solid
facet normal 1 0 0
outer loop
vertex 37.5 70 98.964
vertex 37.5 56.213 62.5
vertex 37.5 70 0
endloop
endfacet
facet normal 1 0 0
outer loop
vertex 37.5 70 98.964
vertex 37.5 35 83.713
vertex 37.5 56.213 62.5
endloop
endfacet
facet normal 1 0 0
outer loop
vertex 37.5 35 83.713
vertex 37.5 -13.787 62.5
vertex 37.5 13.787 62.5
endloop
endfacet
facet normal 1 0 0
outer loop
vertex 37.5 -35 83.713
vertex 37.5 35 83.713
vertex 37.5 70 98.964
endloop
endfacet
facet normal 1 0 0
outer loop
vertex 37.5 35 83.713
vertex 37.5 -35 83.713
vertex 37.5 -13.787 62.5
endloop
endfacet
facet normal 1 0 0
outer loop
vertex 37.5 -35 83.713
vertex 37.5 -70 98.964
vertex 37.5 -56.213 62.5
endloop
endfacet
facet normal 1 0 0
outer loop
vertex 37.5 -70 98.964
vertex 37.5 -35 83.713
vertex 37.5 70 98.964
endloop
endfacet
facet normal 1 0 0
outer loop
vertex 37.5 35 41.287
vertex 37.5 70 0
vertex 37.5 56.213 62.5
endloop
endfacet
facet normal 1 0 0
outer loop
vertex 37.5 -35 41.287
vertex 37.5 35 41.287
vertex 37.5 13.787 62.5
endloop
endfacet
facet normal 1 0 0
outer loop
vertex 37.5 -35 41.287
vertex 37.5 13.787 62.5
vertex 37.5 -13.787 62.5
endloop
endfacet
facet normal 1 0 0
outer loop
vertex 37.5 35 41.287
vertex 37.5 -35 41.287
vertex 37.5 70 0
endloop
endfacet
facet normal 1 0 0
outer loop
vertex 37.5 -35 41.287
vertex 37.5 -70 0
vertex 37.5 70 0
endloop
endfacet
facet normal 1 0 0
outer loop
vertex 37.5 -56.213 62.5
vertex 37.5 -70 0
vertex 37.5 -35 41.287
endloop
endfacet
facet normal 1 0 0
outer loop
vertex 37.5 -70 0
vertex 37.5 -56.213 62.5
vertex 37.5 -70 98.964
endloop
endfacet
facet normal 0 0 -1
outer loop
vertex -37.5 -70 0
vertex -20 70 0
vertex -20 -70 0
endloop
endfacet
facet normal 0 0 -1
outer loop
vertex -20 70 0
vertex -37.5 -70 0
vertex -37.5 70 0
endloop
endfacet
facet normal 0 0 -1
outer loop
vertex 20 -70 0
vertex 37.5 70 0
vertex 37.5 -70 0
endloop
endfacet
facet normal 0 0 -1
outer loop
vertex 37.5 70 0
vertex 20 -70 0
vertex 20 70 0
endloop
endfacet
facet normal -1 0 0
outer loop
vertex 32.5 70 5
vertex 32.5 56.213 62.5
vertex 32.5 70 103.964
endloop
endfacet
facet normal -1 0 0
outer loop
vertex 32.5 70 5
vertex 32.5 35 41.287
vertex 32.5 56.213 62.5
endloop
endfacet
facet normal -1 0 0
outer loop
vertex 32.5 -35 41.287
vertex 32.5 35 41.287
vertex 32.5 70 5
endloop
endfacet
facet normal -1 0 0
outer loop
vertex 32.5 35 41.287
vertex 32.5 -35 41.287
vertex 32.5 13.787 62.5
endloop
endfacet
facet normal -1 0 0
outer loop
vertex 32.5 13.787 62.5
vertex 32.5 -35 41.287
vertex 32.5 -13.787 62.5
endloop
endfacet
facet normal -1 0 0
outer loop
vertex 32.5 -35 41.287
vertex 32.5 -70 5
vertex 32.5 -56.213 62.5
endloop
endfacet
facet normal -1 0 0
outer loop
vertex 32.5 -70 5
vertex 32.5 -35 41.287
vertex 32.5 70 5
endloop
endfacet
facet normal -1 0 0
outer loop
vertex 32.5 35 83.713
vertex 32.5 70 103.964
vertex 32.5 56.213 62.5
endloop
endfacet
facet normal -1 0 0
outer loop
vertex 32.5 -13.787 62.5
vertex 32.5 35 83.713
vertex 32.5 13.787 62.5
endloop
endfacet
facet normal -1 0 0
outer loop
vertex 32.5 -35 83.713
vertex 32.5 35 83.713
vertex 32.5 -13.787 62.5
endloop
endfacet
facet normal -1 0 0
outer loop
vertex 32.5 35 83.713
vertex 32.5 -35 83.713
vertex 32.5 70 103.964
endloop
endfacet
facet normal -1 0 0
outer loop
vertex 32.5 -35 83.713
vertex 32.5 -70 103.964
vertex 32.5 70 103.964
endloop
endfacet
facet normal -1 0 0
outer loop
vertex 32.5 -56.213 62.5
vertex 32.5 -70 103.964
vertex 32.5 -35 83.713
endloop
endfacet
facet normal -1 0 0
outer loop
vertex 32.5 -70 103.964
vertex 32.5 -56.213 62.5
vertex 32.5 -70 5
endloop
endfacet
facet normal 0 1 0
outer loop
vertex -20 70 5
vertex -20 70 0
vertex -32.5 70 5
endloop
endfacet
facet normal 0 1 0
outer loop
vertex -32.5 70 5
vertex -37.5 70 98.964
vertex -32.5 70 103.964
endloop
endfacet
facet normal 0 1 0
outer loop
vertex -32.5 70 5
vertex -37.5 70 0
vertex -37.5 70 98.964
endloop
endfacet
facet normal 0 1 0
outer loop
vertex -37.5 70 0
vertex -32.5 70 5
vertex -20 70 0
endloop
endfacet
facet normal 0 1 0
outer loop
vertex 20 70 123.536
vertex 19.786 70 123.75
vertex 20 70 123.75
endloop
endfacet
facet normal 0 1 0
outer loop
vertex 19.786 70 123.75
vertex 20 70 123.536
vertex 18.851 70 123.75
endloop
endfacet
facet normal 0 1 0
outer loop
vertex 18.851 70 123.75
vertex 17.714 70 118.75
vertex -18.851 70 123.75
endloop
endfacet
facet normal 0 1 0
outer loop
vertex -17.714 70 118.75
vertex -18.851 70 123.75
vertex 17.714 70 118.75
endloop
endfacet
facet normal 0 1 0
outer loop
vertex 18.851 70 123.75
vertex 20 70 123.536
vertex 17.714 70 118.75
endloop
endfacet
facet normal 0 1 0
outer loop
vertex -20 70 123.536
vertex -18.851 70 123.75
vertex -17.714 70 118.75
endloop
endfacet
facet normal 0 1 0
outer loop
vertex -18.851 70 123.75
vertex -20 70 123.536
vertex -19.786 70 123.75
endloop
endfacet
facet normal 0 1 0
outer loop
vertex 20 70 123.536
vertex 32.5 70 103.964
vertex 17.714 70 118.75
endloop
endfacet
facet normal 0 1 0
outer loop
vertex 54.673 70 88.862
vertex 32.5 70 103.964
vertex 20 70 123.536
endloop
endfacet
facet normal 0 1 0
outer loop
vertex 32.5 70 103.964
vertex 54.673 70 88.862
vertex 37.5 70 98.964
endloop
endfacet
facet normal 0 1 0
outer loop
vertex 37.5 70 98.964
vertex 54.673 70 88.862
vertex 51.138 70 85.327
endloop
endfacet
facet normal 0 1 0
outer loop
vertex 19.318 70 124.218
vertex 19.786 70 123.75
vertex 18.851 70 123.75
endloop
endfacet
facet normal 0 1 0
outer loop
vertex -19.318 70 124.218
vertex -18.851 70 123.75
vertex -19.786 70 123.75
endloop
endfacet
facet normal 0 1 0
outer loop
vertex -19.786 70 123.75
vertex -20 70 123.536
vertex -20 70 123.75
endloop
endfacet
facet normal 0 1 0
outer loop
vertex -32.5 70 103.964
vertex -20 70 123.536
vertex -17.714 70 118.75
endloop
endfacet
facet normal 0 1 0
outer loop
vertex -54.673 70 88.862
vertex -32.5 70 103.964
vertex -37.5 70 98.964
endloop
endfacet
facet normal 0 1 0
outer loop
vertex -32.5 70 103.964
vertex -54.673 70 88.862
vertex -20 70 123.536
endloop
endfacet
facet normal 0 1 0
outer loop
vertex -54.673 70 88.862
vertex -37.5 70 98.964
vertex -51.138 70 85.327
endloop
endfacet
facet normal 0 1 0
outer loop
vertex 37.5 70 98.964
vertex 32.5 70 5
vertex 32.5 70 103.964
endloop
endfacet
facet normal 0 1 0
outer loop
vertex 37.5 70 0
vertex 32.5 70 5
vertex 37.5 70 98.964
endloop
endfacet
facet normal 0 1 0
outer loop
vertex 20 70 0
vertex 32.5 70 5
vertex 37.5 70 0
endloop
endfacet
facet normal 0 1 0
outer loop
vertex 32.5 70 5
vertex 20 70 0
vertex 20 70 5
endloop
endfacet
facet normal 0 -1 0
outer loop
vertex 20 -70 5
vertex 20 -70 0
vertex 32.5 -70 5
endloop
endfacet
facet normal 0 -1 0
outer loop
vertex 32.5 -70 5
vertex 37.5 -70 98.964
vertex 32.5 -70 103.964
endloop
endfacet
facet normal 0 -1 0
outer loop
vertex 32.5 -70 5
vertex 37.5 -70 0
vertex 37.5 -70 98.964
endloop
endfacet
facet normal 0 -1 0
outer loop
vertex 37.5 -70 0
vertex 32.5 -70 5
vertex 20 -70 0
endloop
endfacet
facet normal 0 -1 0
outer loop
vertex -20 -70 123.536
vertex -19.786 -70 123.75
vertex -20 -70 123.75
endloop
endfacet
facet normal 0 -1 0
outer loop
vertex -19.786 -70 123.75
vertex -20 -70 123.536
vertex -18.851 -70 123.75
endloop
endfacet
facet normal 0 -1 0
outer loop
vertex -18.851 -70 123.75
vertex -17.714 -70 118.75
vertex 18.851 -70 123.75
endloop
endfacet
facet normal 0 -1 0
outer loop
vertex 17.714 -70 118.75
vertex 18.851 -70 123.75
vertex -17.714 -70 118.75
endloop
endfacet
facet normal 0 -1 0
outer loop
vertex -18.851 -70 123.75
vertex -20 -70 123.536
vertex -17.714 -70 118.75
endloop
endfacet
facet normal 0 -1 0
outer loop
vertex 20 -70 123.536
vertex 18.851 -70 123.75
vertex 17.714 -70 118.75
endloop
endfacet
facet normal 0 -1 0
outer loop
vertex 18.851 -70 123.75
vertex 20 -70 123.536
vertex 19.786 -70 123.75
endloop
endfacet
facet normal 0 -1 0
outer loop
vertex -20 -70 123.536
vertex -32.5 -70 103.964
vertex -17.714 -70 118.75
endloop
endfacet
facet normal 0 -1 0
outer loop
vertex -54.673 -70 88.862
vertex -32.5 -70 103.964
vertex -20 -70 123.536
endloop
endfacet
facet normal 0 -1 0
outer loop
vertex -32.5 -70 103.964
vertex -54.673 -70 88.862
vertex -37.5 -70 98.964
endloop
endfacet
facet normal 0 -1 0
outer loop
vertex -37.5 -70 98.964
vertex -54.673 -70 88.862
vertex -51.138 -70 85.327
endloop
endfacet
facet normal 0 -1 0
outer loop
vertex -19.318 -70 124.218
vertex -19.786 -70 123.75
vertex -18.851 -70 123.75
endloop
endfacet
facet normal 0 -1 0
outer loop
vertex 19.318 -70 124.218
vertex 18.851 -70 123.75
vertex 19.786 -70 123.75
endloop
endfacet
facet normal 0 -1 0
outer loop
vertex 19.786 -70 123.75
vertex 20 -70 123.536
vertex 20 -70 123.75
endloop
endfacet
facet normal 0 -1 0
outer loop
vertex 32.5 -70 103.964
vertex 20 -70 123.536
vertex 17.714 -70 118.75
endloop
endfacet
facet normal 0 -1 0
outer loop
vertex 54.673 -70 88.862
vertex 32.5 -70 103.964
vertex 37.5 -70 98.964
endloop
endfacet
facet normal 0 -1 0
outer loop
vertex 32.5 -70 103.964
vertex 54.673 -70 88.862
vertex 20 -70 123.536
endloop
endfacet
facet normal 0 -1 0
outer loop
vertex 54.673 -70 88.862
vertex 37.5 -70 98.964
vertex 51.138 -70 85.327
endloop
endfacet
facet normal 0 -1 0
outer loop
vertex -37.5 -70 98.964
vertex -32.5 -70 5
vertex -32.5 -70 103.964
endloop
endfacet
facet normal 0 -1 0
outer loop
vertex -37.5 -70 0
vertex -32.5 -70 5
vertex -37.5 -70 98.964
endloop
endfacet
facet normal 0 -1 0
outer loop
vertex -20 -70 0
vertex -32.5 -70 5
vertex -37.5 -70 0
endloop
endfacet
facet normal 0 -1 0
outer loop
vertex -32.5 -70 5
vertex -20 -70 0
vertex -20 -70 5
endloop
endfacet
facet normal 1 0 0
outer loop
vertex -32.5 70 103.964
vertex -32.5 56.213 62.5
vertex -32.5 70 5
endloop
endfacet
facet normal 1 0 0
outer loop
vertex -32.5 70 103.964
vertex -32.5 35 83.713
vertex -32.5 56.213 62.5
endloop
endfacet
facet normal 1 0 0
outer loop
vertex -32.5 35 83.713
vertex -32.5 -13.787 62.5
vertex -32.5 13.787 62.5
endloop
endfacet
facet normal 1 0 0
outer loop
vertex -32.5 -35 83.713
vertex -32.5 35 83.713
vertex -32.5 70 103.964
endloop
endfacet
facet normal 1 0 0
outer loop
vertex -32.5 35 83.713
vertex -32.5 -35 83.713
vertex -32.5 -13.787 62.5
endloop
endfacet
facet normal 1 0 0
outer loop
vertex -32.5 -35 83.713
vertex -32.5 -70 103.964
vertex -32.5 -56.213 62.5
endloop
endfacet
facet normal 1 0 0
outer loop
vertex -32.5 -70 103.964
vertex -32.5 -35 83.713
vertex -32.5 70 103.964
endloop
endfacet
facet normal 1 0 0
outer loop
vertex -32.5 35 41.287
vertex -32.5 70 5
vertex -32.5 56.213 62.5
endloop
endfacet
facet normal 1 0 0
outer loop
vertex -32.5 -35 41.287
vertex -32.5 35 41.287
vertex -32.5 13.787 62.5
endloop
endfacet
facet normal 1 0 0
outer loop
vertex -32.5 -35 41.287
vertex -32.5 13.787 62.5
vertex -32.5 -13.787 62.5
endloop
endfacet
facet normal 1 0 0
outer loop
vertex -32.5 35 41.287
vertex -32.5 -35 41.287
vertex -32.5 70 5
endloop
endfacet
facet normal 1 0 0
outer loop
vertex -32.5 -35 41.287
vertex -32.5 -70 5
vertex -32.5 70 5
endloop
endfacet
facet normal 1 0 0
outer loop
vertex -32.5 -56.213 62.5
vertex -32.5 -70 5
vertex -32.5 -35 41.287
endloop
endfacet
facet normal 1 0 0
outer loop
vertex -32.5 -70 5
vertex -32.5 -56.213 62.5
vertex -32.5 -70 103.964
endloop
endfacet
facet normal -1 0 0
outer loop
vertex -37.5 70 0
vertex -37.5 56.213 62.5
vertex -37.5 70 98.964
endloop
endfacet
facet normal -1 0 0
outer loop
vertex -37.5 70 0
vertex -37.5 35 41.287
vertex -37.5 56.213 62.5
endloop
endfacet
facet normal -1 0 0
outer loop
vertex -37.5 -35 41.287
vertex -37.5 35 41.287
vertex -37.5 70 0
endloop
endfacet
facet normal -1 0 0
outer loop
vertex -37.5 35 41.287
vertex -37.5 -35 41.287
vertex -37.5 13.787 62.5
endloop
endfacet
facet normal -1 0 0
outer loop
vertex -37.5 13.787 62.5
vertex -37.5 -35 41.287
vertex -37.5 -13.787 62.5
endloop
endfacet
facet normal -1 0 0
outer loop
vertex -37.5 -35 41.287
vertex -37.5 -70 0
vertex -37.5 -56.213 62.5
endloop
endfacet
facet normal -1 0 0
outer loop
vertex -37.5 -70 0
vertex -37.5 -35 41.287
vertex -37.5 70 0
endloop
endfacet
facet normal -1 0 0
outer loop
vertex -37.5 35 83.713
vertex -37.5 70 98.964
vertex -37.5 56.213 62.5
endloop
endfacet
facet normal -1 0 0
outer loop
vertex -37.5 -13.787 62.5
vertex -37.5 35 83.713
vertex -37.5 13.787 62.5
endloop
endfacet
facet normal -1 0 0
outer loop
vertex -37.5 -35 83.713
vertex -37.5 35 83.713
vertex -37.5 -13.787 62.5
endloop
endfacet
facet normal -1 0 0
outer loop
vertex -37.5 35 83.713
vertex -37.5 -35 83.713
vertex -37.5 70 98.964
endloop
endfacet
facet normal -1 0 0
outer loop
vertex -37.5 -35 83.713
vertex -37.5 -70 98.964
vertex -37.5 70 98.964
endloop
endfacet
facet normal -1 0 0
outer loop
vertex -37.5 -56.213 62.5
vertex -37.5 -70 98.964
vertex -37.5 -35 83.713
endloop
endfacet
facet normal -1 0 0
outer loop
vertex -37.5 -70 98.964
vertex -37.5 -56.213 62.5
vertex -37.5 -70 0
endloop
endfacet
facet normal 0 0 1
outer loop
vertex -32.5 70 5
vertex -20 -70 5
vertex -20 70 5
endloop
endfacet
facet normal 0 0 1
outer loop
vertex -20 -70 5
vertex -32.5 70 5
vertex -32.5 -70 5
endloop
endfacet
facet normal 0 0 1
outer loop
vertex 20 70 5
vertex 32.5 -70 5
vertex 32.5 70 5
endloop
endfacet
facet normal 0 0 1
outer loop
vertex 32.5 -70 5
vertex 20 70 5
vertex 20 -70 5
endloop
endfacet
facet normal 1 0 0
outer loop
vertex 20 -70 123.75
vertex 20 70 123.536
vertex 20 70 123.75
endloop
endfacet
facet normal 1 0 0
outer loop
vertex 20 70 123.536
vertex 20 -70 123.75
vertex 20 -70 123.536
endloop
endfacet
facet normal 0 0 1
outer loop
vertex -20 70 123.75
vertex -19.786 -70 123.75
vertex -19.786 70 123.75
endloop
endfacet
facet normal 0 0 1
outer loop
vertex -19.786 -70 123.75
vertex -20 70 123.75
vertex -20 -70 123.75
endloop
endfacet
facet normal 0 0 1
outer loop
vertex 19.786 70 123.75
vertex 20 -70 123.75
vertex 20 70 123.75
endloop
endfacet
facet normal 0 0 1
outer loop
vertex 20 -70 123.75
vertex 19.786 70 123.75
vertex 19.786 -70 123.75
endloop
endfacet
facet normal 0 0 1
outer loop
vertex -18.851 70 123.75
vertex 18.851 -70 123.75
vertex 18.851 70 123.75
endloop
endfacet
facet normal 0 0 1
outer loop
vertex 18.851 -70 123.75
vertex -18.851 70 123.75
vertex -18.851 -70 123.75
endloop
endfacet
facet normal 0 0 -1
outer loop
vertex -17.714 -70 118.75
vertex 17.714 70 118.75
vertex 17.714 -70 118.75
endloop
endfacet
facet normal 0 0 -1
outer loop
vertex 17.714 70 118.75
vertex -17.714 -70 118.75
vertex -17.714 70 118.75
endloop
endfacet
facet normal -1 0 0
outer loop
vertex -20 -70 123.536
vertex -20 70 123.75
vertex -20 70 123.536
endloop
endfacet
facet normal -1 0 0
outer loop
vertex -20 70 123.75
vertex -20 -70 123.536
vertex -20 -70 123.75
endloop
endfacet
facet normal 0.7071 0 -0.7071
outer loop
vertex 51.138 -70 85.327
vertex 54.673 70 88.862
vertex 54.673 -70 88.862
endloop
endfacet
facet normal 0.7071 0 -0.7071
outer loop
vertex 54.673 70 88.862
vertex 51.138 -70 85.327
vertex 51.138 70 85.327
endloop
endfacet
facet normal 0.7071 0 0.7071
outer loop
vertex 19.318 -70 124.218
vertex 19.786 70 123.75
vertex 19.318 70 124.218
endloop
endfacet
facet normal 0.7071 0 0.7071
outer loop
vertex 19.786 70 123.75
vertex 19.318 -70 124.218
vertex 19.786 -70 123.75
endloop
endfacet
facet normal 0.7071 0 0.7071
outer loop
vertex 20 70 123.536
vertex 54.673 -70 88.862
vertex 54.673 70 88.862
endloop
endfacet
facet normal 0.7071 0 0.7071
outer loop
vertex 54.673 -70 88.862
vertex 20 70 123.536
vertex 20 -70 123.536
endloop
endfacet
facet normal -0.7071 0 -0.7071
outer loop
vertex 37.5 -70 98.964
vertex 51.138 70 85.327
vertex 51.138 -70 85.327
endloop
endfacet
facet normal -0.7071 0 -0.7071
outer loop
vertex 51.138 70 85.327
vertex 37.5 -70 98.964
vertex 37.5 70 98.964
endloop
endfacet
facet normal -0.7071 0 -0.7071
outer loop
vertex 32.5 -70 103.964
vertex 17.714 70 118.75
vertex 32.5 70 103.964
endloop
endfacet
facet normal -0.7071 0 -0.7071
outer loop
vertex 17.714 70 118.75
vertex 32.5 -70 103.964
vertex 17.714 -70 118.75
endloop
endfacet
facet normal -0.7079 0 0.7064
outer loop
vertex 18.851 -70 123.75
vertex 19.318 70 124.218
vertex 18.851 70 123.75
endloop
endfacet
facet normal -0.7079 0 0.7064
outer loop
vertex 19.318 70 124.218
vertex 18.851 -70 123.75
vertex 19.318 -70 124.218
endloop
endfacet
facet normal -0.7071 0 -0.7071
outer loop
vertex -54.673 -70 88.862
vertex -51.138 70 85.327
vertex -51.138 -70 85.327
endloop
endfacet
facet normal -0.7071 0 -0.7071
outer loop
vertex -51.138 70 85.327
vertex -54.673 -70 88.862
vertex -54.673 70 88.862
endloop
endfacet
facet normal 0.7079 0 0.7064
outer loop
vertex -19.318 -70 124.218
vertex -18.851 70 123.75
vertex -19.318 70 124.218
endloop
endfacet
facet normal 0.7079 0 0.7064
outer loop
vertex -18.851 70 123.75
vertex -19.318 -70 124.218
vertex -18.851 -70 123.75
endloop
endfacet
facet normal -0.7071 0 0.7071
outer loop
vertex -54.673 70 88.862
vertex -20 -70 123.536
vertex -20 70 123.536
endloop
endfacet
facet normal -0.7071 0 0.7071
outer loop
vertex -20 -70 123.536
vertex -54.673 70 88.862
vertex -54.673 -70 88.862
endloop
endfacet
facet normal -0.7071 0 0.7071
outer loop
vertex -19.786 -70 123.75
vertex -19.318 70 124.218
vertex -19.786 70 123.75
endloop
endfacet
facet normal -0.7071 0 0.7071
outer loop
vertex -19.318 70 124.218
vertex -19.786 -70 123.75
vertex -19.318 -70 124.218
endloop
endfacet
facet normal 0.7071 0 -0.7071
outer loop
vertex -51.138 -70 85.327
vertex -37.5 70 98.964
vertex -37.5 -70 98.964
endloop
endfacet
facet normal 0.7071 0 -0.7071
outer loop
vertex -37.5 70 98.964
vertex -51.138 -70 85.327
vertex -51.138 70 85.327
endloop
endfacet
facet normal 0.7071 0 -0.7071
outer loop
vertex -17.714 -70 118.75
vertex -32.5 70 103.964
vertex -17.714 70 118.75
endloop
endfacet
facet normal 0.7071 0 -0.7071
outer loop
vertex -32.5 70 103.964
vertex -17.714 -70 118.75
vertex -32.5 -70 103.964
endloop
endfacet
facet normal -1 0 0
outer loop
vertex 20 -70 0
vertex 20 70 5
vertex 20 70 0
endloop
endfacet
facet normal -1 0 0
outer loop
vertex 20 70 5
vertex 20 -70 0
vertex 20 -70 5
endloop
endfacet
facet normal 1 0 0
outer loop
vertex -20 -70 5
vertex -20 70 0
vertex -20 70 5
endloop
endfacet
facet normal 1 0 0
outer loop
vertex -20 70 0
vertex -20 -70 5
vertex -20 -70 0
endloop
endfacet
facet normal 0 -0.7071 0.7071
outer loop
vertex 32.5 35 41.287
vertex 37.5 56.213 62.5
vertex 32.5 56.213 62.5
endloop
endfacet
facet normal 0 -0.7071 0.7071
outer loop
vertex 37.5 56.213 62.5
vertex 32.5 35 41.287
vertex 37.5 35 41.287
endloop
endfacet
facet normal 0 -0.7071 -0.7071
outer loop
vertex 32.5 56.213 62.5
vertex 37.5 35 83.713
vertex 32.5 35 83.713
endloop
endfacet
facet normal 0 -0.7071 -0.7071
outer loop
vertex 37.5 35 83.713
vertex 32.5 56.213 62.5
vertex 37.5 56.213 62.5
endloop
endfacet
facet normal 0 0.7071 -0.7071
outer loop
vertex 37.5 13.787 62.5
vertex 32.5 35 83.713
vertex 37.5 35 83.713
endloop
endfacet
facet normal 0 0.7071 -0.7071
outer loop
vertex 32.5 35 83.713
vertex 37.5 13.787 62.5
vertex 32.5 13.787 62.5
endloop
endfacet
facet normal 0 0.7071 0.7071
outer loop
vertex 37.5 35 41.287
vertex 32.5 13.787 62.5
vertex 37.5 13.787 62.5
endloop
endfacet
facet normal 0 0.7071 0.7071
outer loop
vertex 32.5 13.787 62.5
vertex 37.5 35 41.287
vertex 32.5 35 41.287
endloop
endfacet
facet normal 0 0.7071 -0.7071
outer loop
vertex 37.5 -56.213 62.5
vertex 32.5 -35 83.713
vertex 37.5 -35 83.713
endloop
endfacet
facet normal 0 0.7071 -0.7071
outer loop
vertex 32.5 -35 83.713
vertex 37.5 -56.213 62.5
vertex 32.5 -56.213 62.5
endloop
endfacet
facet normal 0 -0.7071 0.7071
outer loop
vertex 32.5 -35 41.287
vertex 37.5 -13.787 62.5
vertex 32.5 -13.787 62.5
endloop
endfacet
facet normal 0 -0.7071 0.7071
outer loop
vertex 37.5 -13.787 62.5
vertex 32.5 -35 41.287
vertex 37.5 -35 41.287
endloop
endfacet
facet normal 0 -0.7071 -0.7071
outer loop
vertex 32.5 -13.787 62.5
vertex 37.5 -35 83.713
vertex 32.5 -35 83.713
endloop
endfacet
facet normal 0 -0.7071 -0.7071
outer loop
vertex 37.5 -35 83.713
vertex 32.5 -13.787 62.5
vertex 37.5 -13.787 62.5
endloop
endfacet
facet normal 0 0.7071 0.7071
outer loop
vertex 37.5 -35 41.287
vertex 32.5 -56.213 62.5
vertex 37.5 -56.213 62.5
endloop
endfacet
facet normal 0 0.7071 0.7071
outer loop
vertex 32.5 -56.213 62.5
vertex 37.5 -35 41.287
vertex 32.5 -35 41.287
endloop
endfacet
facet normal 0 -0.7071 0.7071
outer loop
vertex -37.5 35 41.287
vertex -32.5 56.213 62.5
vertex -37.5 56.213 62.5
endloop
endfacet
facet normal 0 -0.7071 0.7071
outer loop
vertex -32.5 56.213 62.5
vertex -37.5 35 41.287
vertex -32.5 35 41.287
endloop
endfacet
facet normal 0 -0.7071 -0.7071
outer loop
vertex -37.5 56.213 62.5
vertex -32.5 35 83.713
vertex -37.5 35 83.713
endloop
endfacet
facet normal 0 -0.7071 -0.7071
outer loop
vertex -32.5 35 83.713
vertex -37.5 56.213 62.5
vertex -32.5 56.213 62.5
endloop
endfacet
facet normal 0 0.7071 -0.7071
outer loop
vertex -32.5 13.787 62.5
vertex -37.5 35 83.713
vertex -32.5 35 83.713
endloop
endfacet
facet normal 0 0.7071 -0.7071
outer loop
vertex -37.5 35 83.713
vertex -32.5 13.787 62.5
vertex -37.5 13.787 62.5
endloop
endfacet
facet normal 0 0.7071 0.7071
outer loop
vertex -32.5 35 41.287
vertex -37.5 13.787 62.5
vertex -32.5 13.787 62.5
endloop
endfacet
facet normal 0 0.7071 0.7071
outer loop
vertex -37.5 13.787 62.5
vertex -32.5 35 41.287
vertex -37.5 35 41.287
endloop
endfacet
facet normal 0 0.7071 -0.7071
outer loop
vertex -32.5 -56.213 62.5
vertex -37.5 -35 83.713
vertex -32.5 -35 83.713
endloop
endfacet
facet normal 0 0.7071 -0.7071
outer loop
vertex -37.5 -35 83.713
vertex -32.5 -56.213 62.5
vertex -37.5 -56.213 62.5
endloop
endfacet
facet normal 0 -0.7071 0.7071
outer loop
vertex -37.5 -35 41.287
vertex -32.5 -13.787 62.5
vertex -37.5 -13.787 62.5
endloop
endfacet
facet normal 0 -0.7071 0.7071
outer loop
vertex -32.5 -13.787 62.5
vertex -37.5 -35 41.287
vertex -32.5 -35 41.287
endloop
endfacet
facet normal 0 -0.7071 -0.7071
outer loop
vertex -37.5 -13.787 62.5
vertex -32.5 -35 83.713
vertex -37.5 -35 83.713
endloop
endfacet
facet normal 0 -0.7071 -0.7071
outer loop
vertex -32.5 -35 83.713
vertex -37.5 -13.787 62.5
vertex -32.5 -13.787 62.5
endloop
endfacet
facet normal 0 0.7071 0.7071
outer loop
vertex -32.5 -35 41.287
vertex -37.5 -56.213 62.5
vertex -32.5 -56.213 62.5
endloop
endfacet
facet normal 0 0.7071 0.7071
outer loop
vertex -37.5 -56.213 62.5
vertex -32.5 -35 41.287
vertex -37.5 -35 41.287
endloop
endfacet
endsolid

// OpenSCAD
module tunnel_cover()
{
  track_width = 40;
  max_car_width = 65;
  wall_height = 105;
  thickness = 5;
  length = 70;
  length = 140;
  
  top_height = 20;
  top_width = 40;
  slant_width = 50;
  
  window_width = 30;
  window_spacing = (length/2)/2;
  window_height = 10;
  difference()
  {
    union()
    {
      //walls
      translate([(max_car_width+thickness)/2,0,wall_height/2]) cube([thickness,length,wall_height],center=true);
      translate([-(max_car_width+thickness)/2,0,wall_height/2]) cube([thickness,length,wall_height],center=true);
      //bottom
      translate([0,0,thickness/2]) cube([max_car_width,length,thickness],center=true);
      //top
      translate([0,0,wall_height+top_height-3.75]) cube([top_width,length,thickness],center=true);
      //slant
      translate([(max_car_width-top_width)-thickness/2,0,wall_height+top_height/2+thickness/2]) rotate([0,45,0]) translate([18,0,0]) cube([slant_width,length,thickness],center=true);
      translate([-((max_car_width-top_width)-thickness/2),0,wall_height+top_height/2+thickness/2]) rotate([0,-45,0]) translate([-18,0,0]) cube([slant_width,length,thickness],center=true);
      
    }
    
    //track cutout
    translate([0,0,thickness/2]) cube([track_width,length+1,thickness+1],center=true);
    //windows
    translate([(max_car_width+thickness)/2,window_spacing,wall_height/2+window_height]) rotate([45,0,0]) cube([thickness+1,window_width,window_width],center=true);
    translate([(max_car_width+thickness)/2,-window_spacing,wall_height/2+window_height]) rotate([45,0,0]) cube([thickness+1,window_width,window_width],center=true);
    translate([-(max_car_width+thickness)/2,window_spacing,wall_height/2+window_height]) rotate([45,0,0]) cube([thickness+1,window_width,window_width],center=true);
    translate([-(max_car_width+thickness)/2,-window_spacing,wall_height/2+window_height]) rotate([45,0,0]) cube([thickness+1,window_width,window_width],center=true);
    
  }
}


tunnel_cover();
